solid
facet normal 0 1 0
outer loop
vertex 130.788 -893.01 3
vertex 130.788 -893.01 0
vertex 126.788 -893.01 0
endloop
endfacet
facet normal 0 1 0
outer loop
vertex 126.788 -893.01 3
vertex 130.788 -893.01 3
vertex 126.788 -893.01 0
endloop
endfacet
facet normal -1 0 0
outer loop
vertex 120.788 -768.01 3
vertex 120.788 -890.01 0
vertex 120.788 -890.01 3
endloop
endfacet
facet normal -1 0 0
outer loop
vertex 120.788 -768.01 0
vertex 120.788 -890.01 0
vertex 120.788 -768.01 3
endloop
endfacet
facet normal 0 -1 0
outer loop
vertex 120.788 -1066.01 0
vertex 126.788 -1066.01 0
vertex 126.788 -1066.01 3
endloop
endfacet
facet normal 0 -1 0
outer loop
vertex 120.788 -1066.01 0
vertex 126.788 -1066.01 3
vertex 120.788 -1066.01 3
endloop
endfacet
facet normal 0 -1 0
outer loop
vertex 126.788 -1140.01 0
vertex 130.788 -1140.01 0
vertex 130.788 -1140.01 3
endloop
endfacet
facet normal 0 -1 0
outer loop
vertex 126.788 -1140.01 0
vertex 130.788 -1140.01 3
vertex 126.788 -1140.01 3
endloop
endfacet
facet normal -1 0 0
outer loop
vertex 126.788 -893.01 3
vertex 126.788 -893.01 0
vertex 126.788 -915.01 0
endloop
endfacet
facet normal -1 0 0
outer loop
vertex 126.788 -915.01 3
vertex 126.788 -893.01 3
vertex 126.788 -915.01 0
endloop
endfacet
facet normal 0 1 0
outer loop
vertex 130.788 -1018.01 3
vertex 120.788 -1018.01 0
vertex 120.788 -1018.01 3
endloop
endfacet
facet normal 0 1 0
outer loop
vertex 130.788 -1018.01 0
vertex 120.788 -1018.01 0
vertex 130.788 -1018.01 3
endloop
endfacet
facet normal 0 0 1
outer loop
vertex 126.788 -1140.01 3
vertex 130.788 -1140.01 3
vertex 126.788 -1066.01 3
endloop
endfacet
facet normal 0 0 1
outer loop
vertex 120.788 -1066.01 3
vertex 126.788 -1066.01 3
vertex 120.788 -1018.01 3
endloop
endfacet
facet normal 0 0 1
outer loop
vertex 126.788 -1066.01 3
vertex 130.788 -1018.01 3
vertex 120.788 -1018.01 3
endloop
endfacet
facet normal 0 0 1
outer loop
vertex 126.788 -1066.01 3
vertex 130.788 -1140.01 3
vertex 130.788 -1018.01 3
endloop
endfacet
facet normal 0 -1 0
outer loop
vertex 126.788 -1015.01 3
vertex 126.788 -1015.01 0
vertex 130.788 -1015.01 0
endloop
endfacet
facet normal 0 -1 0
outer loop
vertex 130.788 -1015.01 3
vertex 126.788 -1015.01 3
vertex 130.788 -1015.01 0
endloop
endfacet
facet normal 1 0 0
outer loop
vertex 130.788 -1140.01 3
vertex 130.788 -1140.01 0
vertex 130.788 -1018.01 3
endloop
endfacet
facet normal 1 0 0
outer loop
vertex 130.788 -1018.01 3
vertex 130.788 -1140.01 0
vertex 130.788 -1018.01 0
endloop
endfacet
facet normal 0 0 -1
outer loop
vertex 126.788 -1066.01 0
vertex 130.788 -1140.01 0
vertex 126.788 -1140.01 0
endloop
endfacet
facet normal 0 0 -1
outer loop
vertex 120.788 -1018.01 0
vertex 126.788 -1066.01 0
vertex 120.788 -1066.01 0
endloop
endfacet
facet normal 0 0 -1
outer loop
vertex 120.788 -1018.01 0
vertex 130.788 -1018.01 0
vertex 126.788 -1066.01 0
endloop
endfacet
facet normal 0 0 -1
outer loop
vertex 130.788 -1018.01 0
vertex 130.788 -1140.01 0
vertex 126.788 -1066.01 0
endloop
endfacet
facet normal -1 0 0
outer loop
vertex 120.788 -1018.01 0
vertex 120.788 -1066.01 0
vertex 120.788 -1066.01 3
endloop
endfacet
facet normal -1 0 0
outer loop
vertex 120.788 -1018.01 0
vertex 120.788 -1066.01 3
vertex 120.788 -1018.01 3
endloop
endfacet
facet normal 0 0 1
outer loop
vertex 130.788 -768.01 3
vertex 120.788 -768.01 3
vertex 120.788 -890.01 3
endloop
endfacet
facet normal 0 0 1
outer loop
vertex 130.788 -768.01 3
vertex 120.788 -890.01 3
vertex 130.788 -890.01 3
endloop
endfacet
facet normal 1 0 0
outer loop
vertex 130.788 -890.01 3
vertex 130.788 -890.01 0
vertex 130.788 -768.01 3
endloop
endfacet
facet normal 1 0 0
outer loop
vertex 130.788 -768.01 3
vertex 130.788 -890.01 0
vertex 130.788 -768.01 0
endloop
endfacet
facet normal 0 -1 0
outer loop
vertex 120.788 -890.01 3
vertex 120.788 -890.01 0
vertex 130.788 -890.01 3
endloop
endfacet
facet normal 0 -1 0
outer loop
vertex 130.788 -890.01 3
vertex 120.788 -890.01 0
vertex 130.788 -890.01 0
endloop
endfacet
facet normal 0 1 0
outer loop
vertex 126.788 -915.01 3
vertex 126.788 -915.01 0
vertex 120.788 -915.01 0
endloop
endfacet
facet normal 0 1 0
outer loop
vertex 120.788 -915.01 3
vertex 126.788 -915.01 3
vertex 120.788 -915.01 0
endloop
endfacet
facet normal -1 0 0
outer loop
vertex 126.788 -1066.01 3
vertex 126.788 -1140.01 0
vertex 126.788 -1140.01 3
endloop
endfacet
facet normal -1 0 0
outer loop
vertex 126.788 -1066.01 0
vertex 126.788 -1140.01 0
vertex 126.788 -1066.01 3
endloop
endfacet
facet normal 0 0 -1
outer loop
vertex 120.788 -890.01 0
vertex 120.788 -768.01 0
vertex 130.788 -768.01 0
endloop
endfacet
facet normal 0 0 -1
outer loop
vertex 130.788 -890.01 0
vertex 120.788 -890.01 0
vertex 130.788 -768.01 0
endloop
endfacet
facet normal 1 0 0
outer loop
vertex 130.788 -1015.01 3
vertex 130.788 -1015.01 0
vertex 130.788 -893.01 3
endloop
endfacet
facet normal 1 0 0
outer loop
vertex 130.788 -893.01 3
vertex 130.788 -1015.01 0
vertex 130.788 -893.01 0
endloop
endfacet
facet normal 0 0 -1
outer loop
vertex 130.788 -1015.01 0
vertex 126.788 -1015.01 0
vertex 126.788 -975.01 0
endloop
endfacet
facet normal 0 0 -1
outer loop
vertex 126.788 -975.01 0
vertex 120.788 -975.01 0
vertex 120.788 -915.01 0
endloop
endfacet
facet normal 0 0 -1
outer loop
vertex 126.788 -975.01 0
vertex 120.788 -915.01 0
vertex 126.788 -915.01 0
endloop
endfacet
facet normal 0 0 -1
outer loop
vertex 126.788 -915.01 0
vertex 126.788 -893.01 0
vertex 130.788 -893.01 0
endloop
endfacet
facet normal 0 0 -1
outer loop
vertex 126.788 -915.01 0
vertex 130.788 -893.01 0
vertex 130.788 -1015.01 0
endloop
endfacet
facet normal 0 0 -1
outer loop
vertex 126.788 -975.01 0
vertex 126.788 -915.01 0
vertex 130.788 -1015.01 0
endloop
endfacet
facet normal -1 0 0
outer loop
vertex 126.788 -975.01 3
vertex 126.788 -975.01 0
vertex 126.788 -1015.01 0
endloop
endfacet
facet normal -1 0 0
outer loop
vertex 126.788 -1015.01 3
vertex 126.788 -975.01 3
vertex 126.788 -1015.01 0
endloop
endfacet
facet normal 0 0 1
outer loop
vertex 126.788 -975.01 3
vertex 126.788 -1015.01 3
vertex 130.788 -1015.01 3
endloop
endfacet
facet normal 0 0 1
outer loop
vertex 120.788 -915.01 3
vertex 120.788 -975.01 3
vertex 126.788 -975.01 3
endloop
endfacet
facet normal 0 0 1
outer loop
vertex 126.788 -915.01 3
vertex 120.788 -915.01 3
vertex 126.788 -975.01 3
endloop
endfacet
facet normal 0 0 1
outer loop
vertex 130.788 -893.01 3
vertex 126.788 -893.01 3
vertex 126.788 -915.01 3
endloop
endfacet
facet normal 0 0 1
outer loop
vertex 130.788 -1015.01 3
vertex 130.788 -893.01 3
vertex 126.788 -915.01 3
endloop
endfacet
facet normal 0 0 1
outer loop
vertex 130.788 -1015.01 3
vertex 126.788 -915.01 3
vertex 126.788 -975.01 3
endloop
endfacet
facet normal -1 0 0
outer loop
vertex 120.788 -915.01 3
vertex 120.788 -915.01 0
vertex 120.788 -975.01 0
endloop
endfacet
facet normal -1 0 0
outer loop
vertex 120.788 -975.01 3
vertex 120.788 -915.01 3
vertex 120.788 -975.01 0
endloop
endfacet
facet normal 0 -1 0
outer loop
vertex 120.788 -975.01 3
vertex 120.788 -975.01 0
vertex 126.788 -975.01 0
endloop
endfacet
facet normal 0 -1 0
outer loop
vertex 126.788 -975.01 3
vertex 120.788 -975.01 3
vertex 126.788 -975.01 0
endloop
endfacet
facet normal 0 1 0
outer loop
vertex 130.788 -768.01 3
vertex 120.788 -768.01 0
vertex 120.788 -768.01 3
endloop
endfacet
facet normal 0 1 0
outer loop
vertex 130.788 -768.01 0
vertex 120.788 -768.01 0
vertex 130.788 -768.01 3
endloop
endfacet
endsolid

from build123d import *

# Parameters (mm, degrees)
SKETCH_1_W        = 10
SKETCH_1_H        = 122
EXTRUDE_1_DEPTH   = 3
EXTRUDE_1_2_DEPTH = 3
EXTRUDE_1_3_DEPTH = 3


with BuildPart() as part:
    # 草图1 → 凸台-拉伸1 (new body)
    with BuildSketch(Plane.XY):
        with Locations((125.787596038, -829.01)):
            Rectangle(SKETCH_1_W, SKETCH_1_H)
    extrude(amount=EXTRUDE_1_DEPTH)


with BuildPart() as body_2:
    # 草图1 → Extrude 1 2 (new body)
    with BuildSketch(Plane.XY):
        Polygon((120.787596038, -975.01), (126.787596038, -975.01), (126.787596038, -1015.01), (130.787596038, -1015.01), (130.787596038, -985.01), (130.787596038, -925.01), (130.787596038, -893.01), (126.787596038, -893.01), (126.787596038, -915.01), (120.787596038, -915.01), align=None)
    extrude(amount=EXTRUDE_1_2_DEPTH)


with BuildPart() as body_3:
    # 草图1 → Extrude 1 3 (new body)
    with BuildSketch(Plane.XY):
        Polygon((120.787596038, -1018.01), (130.787596038, -1018.01), (130.787596038, -1076.01), (130.787596038, -1140.01), (126.787596038, -1140.01), (126.787596038, -1066.01), (120.787596038, -1066.01), align=None)
    extrude(amount=EXTRUDE_1_3_DEPTH)


solid = Compound([part.part, body_2.part, body_3.part])
